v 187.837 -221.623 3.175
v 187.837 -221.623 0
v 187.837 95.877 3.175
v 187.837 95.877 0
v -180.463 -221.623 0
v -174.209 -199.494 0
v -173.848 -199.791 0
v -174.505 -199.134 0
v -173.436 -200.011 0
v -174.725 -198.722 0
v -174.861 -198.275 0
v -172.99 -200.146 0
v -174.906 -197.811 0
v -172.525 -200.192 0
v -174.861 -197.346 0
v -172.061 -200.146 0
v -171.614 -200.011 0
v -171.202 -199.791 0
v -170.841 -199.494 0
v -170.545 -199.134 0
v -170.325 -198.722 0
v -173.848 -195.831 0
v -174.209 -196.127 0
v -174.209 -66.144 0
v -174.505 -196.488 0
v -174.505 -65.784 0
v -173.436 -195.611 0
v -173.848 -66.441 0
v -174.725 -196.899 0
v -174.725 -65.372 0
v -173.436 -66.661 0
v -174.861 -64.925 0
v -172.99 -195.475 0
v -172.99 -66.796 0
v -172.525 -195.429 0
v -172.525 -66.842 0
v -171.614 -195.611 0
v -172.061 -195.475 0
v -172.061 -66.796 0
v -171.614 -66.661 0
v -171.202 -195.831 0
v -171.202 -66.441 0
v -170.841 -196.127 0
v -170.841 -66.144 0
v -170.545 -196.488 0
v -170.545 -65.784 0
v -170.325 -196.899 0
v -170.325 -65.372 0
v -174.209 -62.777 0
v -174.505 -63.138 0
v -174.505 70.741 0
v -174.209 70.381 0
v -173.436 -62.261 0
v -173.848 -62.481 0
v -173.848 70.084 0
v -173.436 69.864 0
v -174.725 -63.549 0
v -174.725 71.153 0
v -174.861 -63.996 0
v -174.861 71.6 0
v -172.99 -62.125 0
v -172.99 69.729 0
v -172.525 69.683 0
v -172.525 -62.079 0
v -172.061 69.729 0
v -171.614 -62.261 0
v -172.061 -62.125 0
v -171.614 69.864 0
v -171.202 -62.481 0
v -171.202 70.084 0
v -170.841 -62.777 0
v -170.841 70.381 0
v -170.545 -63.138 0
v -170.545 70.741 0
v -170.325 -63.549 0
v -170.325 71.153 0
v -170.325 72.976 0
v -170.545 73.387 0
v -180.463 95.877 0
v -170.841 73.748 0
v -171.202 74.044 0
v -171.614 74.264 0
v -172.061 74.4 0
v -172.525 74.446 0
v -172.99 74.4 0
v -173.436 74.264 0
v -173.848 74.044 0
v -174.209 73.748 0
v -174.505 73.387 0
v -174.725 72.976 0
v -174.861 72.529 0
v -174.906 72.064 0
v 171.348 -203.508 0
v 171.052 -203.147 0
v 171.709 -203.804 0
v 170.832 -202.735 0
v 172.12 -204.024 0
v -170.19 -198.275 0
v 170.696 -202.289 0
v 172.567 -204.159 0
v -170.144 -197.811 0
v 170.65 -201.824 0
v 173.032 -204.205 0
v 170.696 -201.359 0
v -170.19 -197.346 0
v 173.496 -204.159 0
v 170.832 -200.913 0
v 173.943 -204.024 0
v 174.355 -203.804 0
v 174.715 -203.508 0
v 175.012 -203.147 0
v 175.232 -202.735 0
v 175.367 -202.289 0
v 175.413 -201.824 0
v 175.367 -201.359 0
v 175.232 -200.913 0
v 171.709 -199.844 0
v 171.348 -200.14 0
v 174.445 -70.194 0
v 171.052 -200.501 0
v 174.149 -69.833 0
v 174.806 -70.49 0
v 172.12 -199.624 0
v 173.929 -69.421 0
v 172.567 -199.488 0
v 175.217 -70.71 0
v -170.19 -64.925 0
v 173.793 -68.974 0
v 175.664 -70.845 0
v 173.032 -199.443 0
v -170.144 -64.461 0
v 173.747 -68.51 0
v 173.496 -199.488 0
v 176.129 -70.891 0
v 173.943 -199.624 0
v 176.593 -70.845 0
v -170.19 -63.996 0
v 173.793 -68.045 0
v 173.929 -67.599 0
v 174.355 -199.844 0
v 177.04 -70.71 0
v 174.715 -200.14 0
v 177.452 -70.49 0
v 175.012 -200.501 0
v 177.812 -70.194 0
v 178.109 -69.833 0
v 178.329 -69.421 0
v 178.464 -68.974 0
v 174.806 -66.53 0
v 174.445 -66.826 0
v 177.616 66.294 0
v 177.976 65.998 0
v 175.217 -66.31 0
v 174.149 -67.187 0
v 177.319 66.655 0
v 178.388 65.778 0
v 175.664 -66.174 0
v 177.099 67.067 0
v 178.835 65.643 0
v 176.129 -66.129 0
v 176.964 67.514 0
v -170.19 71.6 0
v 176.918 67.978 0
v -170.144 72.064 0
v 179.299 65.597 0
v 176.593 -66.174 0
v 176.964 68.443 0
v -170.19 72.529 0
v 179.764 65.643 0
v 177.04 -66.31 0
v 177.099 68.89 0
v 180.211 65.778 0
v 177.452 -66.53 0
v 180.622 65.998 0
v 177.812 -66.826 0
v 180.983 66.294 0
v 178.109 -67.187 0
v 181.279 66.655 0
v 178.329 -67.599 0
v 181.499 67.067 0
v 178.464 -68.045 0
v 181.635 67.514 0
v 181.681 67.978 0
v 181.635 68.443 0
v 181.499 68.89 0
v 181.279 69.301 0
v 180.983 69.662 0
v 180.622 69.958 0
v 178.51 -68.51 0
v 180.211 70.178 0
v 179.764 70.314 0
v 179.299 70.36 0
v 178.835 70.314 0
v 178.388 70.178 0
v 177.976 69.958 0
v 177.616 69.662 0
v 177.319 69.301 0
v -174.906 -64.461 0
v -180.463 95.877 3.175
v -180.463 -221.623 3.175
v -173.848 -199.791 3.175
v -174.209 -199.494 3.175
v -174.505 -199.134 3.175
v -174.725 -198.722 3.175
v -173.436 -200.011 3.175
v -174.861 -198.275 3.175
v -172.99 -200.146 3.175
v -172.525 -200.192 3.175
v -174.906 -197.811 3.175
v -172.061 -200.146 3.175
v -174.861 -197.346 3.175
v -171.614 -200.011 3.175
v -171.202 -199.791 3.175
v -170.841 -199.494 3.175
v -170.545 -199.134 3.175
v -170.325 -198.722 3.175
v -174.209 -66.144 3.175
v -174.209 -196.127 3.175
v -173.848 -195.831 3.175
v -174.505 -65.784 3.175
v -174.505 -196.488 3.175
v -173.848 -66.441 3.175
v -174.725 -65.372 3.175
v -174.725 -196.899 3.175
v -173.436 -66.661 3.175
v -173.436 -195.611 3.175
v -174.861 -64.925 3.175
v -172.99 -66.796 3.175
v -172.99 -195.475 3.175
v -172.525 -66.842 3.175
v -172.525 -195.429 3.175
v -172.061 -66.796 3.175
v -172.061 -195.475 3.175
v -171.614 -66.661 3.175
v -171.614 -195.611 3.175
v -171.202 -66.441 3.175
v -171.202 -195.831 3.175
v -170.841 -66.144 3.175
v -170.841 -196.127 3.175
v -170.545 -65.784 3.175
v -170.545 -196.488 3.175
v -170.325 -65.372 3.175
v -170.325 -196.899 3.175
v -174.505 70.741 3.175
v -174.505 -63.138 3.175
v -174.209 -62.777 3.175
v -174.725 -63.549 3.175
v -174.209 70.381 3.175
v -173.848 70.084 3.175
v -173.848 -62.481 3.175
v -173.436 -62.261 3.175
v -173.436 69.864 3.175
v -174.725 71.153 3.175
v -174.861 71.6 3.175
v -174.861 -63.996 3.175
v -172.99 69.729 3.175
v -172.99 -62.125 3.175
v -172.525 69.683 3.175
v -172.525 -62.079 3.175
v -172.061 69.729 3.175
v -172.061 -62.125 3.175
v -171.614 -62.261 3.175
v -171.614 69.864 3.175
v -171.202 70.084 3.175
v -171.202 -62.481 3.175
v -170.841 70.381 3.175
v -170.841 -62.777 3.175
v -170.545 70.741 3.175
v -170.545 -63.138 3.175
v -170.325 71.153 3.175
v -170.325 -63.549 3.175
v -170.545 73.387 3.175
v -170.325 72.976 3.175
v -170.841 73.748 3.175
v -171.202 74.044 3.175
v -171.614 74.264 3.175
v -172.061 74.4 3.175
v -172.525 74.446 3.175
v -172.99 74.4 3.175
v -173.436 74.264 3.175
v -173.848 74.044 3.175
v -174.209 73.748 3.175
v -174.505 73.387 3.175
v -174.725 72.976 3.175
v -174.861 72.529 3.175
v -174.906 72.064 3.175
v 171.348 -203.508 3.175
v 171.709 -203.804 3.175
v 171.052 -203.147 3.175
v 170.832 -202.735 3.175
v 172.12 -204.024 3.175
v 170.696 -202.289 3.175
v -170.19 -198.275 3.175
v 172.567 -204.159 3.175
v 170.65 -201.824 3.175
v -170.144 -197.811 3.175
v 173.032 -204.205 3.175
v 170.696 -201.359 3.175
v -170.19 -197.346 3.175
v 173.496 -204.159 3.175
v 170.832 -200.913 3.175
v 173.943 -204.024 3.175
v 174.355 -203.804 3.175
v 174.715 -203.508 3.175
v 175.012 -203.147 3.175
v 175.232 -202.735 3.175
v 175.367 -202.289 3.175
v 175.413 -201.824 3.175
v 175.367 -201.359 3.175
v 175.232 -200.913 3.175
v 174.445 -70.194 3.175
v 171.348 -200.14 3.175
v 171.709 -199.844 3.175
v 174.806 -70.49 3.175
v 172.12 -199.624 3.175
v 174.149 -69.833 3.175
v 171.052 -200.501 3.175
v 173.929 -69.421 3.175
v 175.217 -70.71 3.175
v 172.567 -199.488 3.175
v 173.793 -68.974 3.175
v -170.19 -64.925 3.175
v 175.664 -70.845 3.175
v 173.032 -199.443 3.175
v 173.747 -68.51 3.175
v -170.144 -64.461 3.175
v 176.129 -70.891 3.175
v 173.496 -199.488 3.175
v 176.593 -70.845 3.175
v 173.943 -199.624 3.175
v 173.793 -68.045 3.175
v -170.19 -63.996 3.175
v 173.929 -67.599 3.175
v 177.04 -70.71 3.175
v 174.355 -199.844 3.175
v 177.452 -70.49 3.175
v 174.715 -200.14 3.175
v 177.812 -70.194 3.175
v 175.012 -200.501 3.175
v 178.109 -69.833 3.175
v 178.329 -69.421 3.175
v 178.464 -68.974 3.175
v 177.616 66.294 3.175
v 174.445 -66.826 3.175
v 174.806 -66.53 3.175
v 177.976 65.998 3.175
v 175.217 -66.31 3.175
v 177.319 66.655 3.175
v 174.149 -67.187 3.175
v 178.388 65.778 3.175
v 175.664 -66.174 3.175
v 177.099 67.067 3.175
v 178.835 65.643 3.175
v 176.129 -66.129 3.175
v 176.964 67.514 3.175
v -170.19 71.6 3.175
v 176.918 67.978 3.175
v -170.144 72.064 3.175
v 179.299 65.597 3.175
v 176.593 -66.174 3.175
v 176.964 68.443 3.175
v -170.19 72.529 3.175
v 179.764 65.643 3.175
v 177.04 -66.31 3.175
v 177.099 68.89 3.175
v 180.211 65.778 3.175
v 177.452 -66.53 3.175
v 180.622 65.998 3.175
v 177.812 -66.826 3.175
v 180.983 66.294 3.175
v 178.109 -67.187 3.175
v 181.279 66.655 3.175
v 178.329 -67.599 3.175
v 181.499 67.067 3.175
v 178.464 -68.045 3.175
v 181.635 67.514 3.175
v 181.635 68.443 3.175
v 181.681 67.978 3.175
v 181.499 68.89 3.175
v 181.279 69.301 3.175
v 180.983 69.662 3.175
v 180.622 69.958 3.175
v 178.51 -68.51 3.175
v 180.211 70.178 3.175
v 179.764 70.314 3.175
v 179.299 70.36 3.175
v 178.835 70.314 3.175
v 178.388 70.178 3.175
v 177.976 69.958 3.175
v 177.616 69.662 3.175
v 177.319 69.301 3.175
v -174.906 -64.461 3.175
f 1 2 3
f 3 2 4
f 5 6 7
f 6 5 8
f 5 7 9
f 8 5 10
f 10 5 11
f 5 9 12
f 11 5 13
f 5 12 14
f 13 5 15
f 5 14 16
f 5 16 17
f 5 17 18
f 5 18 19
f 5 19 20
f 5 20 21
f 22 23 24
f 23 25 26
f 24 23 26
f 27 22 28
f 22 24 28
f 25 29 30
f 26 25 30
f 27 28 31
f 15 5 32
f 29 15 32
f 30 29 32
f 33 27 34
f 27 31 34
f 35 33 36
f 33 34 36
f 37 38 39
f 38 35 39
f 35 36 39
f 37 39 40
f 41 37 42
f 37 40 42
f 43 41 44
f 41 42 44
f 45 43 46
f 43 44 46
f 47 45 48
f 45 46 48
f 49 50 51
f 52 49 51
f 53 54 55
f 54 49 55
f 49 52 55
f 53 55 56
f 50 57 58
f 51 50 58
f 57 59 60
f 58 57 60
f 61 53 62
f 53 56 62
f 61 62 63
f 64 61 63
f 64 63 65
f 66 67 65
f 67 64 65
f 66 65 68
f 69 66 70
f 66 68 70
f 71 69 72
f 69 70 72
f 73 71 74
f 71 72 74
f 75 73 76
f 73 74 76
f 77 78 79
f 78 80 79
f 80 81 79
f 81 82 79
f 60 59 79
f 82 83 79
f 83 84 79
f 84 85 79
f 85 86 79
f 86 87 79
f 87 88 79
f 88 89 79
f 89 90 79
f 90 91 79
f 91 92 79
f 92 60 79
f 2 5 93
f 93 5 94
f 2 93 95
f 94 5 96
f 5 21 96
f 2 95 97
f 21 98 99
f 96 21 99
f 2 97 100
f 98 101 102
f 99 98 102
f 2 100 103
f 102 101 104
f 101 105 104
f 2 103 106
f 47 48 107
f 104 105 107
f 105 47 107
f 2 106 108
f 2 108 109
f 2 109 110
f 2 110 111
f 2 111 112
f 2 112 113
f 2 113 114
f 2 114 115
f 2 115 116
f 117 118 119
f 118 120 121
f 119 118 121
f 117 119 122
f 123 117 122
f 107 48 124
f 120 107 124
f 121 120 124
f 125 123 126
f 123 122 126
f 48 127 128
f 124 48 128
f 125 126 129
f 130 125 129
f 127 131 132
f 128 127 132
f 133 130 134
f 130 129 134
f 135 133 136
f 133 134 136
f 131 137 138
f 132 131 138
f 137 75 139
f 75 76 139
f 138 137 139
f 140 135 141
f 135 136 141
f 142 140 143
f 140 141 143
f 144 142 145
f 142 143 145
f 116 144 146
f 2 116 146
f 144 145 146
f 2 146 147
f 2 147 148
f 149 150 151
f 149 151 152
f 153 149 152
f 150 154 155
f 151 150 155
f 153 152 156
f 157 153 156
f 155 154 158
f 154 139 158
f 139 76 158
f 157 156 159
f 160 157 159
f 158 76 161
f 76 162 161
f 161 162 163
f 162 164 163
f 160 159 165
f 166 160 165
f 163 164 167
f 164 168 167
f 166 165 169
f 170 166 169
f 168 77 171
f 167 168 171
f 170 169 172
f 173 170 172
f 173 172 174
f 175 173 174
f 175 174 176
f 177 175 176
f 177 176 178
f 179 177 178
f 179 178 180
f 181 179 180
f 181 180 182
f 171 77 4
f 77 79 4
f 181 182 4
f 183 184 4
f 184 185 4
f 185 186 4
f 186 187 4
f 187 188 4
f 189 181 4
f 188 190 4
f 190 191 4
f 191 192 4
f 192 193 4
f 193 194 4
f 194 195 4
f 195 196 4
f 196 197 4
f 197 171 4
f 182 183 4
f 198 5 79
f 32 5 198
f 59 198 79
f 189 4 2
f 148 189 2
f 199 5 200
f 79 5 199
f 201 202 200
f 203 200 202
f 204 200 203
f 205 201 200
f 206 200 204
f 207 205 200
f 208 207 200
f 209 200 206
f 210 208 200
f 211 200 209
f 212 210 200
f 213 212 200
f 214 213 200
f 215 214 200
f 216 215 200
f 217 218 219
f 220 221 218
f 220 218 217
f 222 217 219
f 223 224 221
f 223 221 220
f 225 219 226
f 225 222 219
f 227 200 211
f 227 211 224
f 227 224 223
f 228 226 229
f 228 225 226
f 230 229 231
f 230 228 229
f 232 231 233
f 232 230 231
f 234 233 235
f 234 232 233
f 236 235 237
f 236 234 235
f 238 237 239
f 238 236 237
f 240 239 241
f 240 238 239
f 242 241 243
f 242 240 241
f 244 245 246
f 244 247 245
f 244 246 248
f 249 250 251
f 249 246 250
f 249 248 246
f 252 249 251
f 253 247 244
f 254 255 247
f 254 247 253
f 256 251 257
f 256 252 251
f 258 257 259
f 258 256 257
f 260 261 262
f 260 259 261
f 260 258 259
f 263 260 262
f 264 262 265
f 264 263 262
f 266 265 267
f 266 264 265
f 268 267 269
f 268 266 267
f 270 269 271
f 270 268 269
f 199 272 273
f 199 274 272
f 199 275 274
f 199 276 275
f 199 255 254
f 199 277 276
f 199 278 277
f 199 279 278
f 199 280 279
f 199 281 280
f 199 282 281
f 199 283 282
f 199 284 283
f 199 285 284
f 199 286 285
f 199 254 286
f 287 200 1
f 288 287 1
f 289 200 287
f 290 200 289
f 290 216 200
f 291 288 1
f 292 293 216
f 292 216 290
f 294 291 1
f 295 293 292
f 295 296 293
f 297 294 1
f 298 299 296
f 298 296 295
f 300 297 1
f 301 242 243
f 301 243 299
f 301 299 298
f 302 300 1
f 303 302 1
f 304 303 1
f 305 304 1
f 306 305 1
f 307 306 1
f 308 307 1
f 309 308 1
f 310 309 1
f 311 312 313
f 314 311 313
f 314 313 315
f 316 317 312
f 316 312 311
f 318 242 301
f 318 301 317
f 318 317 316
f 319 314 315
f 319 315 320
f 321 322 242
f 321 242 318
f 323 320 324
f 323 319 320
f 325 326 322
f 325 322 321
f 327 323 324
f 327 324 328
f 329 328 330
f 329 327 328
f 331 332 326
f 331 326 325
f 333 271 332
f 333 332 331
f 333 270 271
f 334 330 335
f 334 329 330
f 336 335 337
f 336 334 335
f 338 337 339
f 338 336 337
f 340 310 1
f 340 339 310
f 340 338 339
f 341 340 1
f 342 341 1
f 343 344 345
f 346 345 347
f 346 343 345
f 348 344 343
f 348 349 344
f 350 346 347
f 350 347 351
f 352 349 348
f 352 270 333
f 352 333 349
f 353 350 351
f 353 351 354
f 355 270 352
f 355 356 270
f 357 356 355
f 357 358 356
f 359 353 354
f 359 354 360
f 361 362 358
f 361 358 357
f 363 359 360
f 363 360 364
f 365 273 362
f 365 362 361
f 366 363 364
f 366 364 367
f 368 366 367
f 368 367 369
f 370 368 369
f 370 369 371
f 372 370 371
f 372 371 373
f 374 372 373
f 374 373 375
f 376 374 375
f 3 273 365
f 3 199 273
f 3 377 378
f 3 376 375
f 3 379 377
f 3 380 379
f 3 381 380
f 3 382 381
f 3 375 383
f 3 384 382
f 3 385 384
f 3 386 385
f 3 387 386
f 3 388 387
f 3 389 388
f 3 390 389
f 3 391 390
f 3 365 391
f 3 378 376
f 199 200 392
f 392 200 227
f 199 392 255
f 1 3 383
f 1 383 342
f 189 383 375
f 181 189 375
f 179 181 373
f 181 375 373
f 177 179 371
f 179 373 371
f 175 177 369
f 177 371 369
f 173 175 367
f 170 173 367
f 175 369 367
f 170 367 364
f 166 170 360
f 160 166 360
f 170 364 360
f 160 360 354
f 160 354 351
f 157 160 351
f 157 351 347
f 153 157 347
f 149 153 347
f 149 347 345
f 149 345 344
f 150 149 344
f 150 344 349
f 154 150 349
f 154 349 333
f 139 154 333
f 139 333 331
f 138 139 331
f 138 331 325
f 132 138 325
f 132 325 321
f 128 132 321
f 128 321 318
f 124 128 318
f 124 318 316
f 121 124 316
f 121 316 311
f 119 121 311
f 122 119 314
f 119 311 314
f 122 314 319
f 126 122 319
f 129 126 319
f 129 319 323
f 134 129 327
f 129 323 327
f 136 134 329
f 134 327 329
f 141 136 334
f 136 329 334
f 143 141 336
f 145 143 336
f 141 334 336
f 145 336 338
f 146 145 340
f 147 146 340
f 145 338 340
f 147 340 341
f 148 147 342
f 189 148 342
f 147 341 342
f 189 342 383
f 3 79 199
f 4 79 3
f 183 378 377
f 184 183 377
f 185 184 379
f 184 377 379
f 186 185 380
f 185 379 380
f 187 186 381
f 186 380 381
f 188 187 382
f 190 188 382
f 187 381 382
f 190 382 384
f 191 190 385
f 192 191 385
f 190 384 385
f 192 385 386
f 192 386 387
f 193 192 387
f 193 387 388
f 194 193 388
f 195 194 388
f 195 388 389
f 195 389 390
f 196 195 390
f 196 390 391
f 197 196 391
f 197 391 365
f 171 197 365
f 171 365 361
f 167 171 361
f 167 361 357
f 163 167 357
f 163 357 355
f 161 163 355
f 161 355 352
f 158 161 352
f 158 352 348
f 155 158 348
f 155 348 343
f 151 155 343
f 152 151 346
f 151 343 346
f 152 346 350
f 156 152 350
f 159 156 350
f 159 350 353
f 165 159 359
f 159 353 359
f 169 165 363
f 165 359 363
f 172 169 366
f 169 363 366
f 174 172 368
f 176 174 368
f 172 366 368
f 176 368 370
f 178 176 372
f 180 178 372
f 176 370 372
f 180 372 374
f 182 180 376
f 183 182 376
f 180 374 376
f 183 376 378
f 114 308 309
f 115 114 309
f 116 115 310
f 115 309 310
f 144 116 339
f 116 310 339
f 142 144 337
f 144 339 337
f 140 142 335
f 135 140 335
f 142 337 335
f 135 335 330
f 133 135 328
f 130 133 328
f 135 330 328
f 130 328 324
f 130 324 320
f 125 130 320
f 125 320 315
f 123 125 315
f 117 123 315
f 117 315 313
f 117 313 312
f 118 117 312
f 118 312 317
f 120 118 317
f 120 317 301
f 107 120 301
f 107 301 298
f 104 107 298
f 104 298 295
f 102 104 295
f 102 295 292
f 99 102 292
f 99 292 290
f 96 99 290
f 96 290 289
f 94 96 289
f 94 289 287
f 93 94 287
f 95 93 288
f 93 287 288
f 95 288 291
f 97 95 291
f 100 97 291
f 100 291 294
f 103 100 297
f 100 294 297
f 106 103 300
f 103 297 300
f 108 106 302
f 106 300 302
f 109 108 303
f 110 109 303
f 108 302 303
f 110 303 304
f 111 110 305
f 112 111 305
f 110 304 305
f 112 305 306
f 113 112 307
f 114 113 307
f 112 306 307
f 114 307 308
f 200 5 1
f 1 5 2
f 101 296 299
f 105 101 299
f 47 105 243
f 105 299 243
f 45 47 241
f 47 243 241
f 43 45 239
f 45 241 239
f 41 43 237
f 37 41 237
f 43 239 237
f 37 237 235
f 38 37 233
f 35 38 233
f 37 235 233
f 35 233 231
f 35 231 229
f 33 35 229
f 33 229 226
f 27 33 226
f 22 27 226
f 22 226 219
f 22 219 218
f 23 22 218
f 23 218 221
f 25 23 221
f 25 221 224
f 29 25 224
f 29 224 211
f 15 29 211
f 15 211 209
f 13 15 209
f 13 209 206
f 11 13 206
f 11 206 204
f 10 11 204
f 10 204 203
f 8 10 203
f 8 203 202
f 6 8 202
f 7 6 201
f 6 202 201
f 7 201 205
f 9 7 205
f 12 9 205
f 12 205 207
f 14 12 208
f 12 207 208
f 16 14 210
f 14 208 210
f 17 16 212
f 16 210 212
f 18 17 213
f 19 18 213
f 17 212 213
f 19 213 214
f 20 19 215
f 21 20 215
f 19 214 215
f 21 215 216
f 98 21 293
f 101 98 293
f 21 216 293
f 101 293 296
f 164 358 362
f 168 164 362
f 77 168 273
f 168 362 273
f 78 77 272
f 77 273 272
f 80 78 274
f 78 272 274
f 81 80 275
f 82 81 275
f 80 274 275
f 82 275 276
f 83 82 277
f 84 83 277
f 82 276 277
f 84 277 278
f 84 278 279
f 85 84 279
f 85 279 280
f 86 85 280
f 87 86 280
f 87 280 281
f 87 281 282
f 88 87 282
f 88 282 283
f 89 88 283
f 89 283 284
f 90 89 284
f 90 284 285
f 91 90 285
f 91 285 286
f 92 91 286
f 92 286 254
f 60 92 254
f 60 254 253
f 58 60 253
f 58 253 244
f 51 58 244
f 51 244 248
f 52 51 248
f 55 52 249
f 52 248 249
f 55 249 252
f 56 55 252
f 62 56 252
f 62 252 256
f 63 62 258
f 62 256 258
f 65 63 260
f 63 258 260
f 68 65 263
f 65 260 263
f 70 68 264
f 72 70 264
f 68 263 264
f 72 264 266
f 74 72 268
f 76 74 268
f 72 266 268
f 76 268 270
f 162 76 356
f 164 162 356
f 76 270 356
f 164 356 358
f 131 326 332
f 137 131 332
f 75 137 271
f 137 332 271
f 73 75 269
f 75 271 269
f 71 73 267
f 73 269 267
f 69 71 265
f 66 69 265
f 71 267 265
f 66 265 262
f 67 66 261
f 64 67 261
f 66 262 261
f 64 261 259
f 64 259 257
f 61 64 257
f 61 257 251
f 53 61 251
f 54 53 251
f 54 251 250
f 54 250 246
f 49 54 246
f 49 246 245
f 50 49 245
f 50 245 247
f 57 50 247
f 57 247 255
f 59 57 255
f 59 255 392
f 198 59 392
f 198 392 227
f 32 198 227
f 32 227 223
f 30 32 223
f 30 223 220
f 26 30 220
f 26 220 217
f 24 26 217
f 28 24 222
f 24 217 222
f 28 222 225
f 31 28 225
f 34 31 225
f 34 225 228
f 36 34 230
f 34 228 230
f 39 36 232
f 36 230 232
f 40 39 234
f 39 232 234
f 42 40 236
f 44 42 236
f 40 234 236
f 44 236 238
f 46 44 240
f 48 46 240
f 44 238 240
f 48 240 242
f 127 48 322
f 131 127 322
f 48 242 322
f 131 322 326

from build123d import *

# Parameters (mm, degrees)
F0_W     = 368.3
F0_H     = 317.5
F1_DEPTH = 3.175
F2_R     = 2.38125
F3_DEPTH = 25.4


with BuildPart() as f1:
    # F0 (on Top) → F1 (new body)
    with BuildSketch(Plane.XY):
        with Locations((3.687429, -62.873167)):
            Rectangle(F0_W, F0_H)
    extrude(amount=F1_DEPTH)

    # F2 (on face) → F3 (cut)
    with BuildSketch(Plane.XY.offset(3.175)):
        with Locations((-172.525071, -197.810667)):
            Circle(F2_R)
        with Locations((-172.525071, -64.460667)):
            Circle(F2_R)
        with Locations((-172.525071, 72.064333)):
            Circle(F2_R)
        with Locations((173.031575, -201.823945)):
            Circle(F2_R)
        with Locations((176.128598, -68.509914)):
            Circle(F2_R)
        with Locations((179.299359, 67.978261)):
            Circle(F2_R)
    extrude(amount=-F3_DEPTH, mode=Mode.SUBTRACT)


solid = f1.part
